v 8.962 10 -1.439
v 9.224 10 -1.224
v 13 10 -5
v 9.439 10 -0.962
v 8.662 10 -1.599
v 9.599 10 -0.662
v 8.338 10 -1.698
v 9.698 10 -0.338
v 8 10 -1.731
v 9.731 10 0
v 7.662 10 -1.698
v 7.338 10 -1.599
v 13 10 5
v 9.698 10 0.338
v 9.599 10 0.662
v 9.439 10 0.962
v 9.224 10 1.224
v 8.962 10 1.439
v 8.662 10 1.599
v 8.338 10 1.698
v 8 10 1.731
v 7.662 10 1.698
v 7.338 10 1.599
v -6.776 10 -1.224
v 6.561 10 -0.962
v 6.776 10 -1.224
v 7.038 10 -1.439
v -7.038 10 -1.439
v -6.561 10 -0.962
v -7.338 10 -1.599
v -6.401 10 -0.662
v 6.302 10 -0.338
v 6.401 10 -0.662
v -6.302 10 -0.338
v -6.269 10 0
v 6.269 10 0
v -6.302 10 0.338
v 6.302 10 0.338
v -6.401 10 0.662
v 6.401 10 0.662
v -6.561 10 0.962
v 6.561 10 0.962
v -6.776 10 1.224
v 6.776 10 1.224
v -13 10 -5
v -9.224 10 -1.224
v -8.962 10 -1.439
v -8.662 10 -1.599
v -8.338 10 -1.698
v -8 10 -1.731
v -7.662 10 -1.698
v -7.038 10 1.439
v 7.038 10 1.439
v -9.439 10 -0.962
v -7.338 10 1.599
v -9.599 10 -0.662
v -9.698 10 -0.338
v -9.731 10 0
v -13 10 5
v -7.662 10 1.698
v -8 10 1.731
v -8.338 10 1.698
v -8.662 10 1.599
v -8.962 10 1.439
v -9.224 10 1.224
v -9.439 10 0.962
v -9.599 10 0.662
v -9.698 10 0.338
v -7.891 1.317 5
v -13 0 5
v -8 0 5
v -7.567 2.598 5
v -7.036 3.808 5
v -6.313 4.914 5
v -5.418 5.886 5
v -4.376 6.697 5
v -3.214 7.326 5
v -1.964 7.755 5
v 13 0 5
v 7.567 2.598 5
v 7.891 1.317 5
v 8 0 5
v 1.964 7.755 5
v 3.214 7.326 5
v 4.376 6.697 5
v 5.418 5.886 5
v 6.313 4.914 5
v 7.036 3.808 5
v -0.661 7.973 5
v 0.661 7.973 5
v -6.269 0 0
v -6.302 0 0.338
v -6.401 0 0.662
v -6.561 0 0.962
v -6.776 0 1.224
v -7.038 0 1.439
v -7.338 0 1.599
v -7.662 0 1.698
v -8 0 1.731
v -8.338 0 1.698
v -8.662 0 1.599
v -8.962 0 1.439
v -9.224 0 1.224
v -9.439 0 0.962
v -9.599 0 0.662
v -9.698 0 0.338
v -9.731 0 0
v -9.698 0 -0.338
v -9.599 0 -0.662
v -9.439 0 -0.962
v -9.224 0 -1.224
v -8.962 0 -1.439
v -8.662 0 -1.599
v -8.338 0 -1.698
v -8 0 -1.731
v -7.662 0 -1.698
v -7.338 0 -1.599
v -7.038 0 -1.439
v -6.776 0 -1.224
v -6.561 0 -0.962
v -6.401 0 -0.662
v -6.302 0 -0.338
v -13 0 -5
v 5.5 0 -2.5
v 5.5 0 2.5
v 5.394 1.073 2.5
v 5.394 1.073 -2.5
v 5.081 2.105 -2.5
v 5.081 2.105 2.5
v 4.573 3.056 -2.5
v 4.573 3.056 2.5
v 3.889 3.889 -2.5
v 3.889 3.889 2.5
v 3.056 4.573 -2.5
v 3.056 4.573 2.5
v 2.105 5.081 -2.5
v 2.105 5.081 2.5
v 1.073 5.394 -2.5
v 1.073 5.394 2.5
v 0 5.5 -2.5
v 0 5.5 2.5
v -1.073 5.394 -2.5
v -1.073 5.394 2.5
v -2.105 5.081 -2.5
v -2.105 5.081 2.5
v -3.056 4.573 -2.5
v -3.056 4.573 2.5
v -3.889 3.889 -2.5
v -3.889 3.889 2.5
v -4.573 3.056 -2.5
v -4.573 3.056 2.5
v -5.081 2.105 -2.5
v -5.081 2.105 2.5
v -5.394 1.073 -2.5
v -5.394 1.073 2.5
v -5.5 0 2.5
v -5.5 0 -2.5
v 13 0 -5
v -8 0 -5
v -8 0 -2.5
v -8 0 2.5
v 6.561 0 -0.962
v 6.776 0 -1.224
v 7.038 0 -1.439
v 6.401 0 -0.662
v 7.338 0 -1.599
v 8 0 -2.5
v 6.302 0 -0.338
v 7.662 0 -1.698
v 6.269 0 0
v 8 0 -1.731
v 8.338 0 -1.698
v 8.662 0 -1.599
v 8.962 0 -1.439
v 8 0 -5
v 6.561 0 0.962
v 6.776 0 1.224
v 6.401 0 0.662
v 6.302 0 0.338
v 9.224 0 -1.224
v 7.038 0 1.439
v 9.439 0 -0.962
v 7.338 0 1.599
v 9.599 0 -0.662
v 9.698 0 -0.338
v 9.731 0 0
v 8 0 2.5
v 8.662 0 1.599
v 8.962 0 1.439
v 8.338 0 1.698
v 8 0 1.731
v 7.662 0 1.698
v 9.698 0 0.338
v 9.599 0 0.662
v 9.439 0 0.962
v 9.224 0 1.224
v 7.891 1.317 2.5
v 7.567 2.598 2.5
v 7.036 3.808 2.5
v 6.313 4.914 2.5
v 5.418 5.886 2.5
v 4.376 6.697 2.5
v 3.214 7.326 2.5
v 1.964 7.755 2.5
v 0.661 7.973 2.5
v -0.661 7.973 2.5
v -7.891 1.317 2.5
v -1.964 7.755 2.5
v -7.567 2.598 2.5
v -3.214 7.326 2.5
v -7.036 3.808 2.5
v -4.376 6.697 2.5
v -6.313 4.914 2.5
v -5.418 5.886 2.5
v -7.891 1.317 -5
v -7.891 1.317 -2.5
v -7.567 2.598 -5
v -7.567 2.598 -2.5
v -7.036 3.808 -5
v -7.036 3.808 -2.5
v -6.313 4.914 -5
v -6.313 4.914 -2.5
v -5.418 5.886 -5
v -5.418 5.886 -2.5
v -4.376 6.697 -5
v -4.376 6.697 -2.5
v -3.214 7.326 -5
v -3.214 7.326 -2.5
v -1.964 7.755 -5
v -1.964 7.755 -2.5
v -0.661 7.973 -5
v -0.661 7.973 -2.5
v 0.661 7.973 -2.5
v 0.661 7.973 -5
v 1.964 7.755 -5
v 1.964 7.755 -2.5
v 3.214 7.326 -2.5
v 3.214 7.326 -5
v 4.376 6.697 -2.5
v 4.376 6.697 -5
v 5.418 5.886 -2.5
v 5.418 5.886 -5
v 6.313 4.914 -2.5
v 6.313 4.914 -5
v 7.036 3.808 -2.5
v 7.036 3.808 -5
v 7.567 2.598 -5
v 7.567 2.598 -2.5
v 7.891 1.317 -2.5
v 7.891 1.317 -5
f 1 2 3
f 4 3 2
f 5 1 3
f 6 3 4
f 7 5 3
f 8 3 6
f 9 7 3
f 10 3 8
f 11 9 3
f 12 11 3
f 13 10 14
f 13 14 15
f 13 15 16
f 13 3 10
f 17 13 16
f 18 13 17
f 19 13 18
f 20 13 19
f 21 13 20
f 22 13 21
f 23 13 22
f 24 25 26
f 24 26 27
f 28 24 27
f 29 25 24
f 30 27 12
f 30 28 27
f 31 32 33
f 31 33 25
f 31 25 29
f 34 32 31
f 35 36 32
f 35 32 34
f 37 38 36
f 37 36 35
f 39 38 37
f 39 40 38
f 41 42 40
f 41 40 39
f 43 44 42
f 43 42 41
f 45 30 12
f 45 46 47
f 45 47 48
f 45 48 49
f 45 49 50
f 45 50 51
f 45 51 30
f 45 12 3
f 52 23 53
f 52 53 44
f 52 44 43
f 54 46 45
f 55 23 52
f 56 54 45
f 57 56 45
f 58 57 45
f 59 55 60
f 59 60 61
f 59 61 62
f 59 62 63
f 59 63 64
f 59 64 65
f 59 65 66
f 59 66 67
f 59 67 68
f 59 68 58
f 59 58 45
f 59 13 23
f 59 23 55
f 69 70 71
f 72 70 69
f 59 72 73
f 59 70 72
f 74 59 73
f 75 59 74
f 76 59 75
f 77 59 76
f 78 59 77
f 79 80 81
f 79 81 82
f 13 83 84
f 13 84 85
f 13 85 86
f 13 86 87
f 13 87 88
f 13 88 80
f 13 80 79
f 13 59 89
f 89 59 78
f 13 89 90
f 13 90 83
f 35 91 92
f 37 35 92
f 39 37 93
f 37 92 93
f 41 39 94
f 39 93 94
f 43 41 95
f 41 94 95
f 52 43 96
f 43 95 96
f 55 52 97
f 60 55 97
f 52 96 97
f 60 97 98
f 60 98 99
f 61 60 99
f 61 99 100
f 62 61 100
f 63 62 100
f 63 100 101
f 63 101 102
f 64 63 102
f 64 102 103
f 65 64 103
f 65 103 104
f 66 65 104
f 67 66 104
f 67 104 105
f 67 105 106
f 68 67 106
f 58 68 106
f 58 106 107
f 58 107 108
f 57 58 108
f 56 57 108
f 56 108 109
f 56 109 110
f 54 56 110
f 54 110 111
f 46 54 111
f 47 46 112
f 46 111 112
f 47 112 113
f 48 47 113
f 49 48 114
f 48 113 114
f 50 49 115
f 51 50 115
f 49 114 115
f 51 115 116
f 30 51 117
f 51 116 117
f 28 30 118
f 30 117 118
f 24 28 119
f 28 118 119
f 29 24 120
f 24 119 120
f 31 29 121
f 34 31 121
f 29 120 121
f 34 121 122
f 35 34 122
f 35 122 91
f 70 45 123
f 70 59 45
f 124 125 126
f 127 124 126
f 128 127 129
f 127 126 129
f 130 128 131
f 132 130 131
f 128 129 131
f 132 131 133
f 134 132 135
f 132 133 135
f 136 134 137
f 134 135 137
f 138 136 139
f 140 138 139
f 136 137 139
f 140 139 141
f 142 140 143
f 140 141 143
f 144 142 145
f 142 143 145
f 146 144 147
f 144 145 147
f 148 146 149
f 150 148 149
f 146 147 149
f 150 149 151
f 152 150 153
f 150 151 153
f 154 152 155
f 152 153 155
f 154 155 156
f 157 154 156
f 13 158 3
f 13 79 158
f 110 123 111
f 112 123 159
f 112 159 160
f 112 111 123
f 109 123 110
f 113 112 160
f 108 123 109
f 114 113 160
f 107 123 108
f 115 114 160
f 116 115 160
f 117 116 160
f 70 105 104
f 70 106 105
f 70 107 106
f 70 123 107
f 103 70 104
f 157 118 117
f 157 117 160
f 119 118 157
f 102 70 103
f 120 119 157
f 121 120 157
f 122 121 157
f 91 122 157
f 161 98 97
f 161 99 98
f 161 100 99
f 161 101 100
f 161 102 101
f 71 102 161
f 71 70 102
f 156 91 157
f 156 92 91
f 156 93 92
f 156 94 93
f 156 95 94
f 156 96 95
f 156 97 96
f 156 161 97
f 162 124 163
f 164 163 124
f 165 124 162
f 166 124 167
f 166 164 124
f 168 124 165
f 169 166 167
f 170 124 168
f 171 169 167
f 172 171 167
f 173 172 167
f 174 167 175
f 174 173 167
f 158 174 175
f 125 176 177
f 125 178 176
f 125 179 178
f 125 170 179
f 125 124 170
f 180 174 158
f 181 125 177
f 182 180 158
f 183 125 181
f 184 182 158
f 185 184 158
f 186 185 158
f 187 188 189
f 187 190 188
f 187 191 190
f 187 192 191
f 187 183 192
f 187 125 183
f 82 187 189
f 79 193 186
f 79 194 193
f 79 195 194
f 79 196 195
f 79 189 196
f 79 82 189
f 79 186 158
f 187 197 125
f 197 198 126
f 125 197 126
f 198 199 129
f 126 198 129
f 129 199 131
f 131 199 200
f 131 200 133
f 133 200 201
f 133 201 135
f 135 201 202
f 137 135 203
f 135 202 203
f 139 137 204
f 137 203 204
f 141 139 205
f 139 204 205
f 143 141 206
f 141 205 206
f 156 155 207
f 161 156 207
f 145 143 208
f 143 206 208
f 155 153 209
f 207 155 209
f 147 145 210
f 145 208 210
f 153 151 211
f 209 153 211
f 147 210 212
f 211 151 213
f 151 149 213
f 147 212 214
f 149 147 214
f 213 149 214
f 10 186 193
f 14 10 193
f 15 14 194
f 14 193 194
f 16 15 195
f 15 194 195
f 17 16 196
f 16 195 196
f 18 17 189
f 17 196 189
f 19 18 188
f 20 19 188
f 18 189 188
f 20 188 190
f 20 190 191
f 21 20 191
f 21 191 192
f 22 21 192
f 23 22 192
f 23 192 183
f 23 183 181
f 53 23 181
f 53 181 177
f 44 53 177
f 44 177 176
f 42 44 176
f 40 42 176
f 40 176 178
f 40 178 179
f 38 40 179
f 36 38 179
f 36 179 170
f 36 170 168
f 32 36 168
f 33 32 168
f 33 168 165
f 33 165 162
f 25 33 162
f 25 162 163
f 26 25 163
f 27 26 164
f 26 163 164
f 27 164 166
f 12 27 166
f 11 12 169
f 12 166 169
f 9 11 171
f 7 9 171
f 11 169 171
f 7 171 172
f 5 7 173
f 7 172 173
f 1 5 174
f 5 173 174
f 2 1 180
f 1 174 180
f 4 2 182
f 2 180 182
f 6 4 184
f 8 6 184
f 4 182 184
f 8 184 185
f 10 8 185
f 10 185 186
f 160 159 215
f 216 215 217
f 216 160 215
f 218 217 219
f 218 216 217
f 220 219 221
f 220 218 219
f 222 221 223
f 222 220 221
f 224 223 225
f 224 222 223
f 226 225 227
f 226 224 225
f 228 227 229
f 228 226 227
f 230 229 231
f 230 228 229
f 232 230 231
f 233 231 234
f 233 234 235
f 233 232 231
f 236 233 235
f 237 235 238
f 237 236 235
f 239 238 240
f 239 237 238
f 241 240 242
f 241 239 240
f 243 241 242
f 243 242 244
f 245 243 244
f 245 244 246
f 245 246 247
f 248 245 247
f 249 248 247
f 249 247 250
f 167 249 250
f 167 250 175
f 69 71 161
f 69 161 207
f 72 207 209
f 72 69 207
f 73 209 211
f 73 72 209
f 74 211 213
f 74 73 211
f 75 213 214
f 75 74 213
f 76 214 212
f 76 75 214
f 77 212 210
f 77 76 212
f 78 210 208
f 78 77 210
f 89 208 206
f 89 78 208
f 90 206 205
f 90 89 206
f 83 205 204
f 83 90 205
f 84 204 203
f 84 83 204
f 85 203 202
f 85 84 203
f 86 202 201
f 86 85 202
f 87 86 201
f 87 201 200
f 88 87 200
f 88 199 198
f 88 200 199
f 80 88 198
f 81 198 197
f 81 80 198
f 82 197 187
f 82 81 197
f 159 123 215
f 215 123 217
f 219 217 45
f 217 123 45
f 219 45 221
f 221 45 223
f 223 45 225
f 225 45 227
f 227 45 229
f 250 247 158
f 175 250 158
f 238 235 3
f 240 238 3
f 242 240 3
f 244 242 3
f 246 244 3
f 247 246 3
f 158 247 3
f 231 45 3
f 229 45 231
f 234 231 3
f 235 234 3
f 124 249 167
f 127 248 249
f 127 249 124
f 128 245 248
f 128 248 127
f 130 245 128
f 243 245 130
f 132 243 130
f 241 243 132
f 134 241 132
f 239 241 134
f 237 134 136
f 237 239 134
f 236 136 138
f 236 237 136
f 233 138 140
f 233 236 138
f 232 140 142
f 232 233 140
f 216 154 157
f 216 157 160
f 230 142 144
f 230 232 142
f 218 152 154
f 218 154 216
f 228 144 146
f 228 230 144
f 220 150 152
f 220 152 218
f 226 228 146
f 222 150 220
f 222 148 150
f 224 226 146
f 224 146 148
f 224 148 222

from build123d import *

# Parameters (mm, degrees)
RESSALTO_EXTRUS_O1_DEPTH = 2.5
RESSALTO_EXTRUS_O2_DEPTH = 5
ESBO_O2_R                = 1.730913938
CORTE_EXTRUS_O1_DEPTH    = 15


with BuildPart() as part:
    # Esboço1 → Ressalto-extrusão1 (new, symmetric)
    with BuildSketch(Plane.XY):
        with BuildLine():
            Line((-5.5, 0), (-13, 0))
            Line((-13, 0), (-13, 10))
            Line((-13, 10), (13, 10))
            Line((13, 10), (13, 0))
            Line((13, 0), (5.5, 0))
            ThreePointArc((5.5, 0), (0, 5.5), (-5.5, 0))
        make_face()
    extrude(amount=RESSALTO_EXTRUS_O1_DEPTH, both=True)

    # Esboço3 → Ressalto-extrusão2 (add, symmetric)
    with BuildSketch(Plane.XY):
        with BuildLine():
            Line((-13, 10), (-13, 0))
            Line((-13, 0), (-8, 0))
            ThreePointArc((-8, 0), (0, 8), (8, 0))
            Line((8, 0), (13, 0))
            Line((13, 0), (13, 10))
            Line((13, 10), (-13, 10))
        make_face()
    extrude(amount=RESSALTO_EXTRUS_O2_DEPTH, both=True)

    # Esboço2 → Corte-extrusão1 (cut)
    with BuildSketch(Plane.XZ):
        with Locations((-8, 0)):
            Circle(ESBO_O2_R)
        with Locations((8, 0)):
            Circle(ESBO_O2_R)
    extrude(amount=-CORTE_EXTRUS_O1_DEPTH, mode=Mode.SUBTRACT)


solid = part.part
